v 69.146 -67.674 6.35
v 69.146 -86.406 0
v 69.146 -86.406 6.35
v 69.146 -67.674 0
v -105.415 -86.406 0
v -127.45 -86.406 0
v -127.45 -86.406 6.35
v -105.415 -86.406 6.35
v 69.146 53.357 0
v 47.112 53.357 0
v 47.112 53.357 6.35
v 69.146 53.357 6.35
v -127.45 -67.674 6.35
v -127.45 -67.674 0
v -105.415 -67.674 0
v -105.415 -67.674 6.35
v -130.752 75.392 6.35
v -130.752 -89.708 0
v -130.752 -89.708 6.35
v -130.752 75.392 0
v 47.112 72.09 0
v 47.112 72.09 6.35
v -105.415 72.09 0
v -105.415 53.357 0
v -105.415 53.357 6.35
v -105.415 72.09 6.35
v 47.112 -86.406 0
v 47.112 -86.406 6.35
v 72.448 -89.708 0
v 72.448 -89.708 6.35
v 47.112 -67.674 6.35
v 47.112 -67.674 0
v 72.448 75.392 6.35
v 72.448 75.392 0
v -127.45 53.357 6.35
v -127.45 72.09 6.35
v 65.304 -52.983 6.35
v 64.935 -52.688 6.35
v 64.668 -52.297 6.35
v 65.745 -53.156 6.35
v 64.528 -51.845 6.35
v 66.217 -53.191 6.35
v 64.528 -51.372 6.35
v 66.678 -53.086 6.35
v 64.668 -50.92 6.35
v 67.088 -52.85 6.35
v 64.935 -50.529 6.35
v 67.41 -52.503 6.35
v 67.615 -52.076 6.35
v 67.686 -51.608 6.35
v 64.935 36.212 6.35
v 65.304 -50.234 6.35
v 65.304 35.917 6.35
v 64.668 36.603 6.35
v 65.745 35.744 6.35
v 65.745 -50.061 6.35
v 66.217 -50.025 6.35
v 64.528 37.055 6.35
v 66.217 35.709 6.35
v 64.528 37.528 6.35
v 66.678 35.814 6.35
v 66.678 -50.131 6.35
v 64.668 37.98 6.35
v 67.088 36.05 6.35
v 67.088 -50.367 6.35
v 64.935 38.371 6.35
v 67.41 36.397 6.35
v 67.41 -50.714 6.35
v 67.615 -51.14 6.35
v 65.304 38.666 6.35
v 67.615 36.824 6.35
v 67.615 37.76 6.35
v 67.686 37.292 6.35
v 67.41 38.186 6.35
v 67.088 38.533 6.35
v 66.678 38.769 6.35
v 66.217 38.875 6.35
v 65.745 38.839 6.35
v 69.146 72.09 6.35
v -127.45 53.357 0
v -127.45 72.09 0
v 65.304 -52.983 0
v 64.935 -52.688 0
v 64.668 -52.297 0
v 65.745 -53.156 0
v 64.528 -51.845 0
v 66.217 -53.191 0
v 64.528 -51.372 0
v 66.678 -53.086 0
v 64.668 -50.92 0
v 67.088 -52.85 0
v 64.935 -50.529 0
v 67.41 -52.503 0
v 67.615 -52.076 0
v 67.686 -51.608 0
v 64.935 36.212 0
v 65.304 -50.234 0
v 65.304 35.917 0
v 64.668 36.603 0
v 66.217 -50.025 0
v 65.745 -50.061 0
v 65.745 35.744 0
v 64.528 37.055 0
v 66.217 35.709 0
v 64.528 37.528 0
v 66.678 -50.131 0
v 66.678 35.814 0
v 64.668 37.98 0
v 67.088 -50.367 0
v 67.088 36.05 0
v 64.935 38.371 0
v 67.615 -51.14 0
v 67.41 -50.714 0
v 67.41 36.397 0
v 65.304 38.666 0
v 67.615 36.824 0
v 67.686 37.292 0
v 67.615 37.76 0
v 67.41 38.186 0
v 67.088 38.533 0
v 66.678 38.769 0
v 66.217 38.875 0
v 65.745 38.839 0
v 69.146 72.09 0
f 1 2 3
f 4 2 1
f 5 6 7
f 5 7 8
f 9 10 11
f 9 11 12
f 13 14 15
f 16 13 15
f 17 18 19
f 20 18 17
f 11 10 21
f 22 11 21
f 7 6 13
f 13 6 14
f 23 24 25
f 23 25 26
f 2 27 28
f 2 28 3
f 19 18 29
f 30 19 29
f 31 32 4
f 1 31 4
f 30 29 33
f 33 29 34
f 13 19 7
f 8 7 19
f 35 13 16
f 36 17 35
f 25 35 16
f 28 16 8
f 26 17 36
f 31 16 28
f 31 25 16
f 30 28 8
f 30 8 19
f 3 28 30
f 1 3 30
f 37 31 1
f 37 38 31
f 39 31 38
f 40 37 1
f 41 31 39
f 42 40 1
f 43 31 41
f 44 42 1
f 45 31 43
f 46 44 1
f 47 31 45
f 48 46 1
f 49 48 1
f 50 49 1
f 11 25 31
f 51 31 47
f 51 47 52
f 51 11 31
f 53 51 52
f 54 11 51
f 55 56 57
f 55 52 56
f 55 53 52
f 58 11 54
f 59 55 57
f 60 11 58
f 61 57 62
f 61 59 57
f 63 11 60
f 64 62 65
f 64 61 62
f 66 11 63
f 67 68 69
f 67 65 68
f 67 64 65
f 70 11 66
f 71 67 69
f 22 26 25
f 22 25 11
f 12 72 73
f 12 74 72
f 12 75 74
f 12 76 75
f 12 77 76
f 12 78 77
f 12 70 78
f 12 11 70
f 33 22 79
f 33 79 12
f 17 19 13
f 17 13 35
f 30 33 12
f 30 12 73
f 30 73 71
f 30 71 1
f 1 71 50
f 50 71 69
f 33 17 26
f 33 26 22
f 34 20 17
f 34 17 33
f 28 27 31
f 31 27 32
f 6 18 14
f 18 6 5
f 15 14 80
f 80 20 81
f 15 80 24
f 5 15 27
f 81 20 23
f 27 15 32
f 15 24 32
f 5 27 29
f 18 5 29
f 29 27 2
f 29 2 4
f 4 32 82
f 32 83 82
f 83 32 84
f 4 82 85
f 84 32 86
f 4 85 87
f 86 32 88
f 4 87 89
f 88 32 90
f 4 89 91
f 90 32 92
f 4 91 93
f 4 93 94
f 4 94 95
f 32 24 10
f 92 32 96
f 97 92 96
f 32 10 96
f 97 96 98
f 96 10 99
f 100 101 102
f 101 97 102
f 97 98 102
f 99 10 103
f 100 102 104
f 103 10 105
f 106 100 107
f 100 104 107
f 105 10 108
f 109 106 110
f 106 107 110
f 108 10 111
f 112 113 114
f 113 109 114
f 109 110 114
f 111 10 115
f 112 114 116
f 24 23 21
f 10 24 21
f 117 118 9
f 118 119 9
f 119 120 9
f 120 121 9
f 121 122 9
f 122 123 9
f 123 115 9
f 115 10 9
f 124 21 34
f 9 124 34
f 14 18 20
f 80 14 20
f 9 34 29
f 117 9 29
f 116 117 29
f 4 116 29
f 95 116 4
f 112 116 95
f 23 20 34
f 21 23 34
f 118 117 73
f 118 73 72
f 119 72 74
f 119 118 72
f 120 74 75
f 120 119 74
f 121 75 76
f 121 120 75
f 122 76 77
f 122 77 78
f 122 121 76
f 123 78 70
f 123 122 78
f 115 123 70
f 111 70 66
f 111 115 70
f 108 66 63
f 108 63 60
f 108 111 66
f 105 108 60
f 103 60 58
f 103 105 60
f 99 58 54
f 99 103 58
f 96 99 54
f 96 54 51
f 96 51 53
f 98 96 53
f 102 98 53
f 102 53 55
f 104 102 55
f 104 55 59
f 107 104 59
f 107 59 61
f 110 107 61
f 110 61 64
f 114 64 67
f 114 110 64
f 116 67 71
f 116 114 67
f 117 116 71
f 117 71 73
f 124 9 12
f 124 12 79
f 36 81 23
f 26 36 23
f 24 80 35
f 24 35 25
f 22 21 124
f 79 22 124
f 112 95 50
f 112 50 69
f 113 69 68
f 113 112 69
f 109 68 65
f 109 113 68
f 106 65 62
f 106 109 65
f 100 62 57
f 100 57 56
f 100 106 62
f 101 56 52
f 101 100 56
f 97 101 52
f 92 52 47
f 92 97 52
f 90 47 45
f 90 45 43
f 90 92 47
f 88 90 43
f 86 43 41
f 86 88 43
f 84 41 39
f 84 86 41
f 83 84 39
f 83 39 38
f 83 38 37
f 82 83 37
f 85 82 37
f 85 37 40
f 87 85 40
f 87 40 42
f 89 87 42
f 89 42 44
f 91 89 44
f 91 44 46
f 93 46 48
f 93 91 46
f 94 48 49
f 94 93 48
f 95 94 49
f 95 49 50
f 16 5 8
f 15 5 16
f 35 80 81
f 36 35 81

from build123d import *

# Parameters (mm, degrees)
SKETCH1_W           = 203.2
SKETCH1_H           = 165.1
SKETCH1_R           = 1.5875
SKETCH1_W_2         = 22.0345
SKETCH1_H_2         = 18.7325
BOSS_EXTRUDE1_DEPTH = 6.35


with BuildPart() as part:
    # Sketch1 → Boss-Extrude1 (new body)
    with BuildSketch(Plane.XY):
        with Locations((-29.151775306, -7.158362635)):
            Rectangle(SKETCH1_W, SKETCH1_H)
        with Locations((66.098224694, 37.291637365)):
            Circle(SKETCH1_R, mode=Mode.SUBTRACT)
        with Locations((66.098224694, -51.608362635)):
            Circle(SKETCH1_R, mode=Mode.SUBTRACT)
        with Locations((58.128974694, 62.723387365)):
            Rectangle(SKETCH1_W_2, SKETCH1_H_2, mode=Mode.SUBTRACT)
        with Locations((-116.432525306, 62.723387365)):
            Rectangle(SKETCH1_W_2, SKETCH1_H_2, mode=Mode.SUBTRACT)
        with Locations((58.128974694, -77.040112635)):
            Rectangle(SKETCH1_W_2, SKETCH1_H_2, mode=Mode.SUBTRACT)
        with Locations((-116.432525306, -77.040112635)):
            Rectangle(SKETCH1_W_2, SKETCH1_H_2, mode=Mode.SUBTRACT)
    extrude(amount=BOSS_EXTRUDE1_DEPTH)


solid = part.part
